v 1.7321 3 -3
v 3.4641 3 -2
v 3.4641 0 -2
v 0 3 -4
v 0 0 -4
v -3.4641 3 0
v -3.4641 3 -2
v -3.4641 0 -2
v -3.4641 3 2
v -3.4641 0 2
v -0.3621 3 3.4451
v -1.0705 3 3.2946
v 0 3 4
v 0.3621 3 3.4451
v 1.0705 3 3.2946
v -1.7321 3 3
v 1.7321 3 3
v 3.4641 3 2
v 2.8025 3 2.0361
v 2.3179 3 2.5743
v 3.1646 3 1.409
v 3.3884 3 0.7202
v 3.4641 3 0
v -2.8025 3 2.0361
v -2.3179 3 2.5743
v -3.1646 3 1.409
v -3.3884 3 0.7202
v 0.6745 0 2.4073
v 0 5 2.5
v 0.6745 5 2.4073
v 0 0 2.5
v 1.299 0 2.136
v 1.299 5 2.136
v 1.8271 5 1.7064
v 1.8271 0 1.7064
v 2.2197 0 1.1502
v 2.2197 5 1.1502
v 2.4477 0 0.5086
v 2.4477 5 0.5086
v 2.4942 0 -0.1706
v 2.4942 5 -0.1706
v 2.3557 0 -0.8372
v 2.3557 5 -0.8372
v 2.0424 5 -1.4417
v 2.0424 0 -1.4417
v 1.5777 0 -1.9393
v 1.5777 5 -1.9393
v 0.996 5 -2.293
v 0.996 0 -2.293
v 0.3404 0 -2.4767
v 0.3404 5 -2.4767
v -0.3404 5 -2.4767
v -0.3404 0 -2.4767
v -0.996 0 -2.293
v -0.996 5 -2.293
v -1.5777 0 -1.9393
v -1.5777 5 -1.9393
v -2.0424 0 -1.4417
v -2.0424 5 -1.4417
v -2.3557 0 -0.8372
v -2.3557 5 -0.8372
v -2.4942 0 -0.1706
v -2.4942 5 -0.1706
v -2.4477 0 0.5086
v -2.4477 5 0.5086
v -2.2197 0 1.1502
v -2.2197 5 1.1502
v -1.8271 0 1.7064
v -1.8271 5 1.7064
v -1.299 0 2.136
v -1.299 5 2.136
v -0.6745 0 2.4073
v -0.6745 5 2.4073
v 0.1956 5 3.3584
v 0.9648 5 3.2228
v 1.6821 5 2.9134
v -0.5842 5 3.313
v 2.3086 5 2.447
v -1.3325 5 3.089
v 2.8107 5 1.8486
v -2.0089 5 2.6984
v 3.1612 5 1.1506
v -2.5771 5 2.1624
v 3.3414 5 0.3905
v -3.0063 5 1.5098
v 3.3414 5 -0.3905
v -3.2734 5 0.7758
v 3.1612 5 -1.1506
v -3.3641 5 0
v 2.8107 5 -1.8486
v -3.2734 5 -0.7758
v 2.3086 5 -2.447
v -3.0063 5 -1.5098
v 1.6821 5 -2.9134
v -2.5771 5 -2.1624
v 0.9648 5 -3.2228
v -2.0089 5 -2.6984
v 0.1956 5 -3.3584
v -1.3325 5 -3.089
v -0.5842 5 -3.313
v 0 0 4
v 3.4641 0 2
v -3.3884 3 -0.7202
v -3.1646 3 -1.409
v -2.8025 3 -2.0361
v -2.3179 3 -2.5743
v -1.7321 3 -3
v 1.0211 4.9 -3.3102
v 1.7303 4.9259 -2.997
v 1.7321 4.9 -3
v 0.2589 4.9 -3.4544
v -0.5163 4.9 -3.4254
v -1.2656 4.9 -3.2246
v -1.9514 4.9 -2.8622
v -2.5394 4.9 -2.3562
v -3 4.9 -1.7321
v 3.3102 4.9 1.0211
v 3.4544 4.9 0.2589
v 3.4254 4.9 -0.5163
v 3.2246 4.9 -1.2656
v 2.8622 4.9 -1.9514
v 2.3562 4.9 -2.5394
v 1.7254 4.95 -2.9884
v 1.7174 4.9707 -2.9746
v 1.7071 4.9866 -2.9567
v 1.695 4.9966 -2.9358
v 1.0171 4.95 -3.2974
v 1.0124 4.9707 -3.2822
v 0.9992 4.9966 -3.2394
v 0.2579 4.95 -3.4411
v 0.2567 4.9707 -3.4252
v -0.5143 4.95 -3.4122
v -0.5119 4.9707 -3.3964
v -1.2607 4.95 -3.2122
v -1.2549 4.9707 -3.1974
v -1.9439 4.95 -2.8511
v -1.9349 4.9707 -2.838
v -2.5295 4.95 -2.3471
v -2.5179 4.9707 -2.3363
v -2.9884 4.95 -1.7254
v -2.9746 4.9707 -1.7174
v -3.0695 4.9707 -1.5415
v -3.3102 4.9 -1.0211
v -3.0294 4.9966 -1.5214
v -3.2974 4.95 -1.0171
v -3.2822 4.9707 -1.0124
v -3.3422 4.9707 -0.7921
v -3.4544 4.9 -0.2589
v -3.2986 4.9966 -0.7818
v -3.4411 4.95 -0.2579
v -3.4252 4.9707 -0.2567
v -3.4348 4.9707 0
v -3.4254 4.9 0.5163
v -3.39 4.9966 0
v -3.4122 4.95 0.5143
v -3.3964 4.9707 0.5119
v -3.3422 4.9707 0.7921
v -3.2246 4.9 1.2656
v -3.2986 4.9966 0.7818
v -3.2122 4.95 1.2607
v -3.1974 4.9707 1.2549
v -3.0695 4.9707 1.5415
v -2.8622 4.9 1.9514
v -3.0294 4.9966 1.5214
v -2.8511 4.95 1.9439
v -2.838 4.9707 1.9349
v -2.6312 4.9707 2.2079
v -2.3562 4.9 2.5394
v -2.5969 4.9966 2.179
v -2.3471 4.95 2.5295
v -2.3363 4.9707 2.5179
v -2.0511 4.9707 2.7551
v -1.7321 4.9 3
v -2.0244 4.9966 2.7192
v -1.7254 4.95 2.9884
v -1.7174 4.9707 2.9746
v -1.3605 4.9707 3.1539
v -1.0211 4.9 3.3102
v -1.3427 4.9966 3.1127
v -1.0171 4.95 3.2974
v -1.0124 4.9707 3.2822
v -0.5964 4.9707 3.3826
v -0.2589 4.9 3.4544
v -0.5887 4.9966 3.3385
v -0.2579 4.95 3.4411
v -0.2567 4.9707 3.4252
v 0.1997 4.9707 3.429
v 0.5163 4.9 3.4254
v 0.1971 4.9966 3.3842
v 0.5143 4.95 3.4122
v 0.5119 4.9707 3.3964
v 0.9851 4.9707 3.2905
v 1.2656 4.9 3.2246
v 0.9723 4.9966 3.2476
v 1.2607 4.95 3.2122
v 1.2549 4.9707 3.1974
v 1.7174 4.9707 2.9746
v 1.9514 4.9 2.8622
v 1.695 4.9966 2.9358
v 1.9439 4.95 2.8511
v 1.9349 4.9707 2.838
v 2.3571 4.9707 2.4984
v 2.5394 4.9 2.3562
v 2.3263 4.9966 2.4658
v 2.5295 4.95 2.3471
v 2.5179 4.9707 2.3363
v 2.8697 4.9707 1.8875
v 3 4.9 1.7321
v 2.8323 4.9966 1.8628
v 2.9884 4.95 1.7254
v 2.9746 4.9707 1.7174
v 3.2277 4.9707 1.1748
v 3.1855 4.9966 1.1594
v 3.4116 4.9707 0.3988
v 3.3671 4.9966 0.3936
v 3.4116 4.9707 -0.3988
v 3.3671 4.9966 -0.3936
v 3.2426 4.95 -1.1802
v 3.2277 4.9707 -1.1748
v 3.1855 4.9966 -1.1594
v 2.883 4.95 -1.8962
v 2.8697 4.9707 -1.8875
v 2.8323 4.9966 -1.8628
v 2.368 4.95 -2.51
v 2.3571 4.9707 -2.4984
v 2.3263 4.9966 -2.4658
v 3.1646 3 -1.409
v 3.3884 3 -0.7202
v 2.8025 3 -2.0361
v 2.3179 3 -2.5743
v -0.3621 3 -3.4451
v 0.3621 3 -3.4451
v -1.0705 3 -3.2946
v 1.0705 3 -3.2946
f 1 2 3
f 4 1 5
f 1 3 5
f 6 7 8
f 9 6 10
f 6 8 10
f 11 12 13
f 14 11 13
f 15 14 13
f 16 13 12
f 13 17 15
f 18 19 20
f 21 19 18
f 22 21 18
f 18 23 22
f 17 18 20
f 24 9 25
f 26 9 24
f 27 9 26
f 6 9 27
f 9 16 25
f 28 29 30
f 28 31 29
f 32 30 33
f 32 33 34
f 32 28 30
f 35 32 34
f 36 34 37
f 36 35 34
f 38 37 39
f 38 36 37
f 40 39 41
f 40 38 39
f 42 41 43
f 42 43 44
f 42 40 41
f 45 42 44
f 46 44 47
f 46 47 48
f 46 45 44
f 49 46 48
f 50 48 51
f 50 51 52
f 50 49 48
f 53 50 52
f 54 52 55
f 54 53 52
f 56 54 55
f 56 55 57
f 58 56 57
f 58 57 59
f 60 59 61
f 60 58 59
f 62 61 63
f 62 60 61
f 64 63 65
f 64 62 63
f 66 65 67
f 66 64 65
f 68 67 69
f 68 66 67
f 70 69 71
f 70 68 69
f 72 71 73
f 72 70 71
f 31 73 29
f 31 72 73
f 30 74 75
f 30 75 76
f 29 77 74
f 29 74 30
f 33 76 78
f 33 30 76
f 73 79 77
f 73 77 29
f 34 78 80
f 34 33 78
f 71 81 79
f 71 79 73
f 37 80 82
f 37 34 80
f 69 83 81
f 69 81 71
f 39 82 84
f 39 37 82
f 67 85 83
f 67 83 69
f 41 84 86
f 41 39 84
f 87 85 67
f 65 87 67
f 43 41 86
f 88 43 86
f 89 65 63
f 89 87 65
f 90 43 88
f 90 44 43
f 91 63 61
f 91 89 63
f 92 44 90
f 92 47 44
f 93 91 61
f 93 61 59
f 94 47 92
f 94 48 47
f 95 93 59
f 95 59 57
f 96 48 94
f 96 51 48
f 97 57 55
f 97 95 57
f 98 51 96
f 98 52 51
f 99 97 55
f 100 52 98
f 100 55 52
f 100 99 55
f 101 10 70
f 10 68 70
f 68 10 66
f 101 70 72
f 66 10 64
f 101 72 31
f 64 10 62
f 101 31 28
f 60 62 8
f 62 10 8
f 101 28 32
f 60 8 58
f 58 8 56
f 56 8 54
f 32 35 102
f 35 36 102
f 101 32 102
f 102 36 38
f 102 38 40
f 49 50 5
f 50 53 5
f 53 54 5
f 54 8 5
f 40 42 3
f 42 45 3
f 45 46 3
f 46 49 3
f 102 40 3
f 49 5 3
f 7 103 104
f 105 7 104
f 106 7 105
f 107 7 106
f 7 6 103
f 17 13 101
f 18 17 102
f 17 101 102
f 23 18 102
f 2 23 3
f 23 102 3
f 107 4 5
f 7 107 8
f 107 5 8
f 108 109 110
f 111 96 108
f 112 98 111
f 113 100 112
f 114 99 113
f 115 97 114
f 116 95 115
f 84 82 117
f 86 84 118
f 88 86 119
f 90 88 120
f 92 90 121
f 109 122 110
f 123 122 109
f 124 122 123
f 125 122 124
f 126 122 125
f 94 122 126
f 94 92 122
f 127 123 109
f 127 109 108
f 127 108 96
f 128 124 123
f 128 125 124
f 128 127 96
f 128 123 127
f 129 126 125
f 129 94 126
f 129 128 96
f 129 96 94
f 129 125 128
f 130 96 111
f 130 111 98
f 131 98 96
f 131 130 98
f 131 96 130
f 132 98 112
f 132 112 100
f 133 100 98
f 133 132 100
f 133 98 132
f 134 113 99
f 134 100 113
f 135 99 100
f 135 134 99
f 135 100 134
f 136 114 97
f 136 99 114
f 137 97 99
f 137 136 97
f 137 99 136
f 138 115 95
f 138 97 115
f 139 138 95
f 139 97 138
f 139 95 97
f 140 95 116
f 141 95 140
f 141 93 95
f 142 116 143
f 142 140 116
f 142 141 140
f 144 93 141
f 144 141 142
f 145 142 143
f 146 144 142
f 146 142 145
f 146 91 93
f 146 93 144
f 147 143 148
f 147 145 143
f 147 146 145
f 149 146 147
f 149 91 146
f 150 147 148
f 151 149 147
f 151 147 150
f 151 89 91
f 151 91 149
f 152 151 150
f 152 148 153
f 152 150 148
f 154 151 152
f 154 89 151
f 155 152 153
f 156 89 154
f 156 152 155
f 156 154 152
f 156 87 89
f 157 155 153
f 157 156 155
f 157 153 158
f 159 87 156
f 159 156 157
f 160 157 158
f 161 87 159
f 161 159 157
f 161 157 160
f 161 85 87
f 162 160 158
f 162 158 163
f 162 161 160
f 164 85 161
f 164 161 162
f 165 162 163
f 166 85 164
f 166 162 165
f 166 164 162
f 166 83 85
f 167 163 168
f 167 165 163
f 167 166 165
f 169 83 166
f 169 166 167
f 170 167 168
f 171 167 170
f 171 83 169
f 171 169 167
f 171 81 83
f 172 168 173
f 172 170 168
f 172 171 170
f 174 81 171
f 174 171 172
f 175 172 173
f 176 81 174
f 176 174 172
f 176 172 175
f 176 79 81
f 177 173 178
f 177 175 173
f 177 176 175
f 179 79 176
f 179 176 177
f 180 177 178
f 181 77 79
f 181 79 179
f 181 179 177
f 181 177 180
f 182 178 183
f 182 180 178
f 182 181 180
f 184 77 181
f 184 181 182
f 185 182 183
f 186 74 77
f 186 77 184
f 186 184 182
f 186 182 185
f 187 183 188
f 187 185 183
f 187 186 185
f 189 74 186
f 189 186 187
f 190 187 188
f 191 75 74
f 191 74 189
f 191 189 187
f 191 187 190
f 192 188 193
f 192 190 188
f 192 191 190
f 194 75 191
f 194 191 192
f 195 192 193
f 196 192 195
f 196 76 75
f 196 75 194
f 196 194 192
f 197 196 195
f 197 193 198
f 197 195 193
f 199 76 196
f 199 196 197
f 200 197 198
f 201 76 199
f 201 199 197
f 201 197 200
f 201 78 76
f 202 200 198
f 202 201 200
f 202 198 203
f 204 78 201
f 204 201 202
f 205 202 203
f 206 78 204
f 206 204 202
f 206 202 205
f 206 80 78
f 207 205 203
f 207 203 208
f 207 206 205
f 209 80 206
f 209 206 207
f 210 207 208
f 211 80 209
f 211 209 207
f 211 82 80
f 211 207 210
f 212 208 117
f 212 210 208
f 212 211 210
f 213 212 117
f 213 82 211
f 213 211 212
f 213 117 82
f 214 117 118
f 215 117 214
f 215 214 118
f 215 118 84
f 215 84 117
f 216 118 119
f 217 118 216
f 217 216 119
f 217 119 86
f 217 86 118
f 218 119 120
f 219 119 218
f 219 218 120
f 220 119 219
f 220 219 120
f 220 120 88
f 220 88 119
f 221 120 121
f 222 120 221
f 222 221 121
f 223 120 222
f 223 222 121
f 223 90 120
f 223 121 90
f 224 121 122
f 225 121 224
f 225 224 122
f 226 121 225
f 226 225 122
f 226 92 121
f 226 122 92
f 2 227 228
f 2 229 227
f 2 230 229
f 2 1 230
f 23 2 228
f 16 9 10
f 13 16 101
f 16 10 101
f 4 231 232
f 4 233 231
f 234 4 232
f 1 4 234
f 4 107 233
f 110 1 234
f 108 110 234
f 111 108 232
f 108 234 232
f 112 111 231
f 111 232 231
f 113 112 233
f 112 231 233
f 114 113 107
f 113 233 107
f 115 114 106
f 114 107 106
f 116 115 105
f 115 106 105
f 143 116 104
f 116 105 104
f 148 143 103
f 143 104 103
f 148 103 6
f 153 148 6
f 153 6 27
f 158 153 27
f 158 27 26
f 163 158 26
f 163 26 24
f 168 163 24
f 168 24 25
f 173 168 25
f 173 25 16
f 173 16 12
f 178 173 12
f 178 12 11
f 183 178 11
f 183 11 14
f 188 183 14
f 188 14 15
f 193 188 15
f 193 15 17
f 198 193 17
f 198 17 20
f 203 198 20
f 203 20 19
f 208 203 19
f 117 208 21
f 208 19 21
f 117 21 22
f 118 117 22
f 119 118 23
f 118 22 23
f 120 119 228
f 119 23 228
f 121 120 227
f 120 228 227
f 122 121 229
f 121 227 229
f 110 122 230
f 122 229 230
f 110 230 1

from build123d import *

# Parameters (mm, degrees)
SKETCH1_R           = 2.5
BOSS_EXTRUDE1_DEPTH = 3
SKETCH2_R           = 3.464101615
SKETCH2_R_2         = 2.5
BOSS_EXTRUDE2_DEPTH = 2
FILLET1_R           = 0.1


with BuildPart() as part:
    # Sketch1 → Boss-Extrude1 (new body)
    with BuildSketch(Plane(origin=(0, 0, 0), x_dir=(1, 0, 0), z_dir=(0, 1, 0))):
        Polygon((0, 4), (-3.464101615, 2), (-3.464101615, -2), (0, -4), (3.464101615, -2), (3.464101615, 2), align=None)
        with Locations(Location((0, 0, 0), (0, 0, 270))):
            Circle(SKETCH1_R, mode=Mode.SUBTRACT)
    extrude(amount=BOSS_EXTRUDE1_DEPTH)

    # Sketch2 → Boss-Extrude2 (add)
    with BuildSketch(Plane(origin=(0, 3, 0), x_dir=(1, 0, 0), z_dir=(0, 1, 0))):
        with Locations(Location((0, 0, 0), (0, 0, 60))):
            Circle(SKETCH2_R)
        with Locations(Location((0, 0, 0), (0, 0, 270))):
            Circle(SKETCH2_R_2, mode=Mode.SUBTRACT)
    extrude(amount=BOSS_EXTRUDE2_DEPTH)

    # Fillet1
    fillet1_edges = [part.edges().sort_by_distance(p)[0] for p in [
        (-1.732050808, 5, 3),
    ]]
    fillet(fillet1_edges, radius=FILLET1_R)


solid = part.part
